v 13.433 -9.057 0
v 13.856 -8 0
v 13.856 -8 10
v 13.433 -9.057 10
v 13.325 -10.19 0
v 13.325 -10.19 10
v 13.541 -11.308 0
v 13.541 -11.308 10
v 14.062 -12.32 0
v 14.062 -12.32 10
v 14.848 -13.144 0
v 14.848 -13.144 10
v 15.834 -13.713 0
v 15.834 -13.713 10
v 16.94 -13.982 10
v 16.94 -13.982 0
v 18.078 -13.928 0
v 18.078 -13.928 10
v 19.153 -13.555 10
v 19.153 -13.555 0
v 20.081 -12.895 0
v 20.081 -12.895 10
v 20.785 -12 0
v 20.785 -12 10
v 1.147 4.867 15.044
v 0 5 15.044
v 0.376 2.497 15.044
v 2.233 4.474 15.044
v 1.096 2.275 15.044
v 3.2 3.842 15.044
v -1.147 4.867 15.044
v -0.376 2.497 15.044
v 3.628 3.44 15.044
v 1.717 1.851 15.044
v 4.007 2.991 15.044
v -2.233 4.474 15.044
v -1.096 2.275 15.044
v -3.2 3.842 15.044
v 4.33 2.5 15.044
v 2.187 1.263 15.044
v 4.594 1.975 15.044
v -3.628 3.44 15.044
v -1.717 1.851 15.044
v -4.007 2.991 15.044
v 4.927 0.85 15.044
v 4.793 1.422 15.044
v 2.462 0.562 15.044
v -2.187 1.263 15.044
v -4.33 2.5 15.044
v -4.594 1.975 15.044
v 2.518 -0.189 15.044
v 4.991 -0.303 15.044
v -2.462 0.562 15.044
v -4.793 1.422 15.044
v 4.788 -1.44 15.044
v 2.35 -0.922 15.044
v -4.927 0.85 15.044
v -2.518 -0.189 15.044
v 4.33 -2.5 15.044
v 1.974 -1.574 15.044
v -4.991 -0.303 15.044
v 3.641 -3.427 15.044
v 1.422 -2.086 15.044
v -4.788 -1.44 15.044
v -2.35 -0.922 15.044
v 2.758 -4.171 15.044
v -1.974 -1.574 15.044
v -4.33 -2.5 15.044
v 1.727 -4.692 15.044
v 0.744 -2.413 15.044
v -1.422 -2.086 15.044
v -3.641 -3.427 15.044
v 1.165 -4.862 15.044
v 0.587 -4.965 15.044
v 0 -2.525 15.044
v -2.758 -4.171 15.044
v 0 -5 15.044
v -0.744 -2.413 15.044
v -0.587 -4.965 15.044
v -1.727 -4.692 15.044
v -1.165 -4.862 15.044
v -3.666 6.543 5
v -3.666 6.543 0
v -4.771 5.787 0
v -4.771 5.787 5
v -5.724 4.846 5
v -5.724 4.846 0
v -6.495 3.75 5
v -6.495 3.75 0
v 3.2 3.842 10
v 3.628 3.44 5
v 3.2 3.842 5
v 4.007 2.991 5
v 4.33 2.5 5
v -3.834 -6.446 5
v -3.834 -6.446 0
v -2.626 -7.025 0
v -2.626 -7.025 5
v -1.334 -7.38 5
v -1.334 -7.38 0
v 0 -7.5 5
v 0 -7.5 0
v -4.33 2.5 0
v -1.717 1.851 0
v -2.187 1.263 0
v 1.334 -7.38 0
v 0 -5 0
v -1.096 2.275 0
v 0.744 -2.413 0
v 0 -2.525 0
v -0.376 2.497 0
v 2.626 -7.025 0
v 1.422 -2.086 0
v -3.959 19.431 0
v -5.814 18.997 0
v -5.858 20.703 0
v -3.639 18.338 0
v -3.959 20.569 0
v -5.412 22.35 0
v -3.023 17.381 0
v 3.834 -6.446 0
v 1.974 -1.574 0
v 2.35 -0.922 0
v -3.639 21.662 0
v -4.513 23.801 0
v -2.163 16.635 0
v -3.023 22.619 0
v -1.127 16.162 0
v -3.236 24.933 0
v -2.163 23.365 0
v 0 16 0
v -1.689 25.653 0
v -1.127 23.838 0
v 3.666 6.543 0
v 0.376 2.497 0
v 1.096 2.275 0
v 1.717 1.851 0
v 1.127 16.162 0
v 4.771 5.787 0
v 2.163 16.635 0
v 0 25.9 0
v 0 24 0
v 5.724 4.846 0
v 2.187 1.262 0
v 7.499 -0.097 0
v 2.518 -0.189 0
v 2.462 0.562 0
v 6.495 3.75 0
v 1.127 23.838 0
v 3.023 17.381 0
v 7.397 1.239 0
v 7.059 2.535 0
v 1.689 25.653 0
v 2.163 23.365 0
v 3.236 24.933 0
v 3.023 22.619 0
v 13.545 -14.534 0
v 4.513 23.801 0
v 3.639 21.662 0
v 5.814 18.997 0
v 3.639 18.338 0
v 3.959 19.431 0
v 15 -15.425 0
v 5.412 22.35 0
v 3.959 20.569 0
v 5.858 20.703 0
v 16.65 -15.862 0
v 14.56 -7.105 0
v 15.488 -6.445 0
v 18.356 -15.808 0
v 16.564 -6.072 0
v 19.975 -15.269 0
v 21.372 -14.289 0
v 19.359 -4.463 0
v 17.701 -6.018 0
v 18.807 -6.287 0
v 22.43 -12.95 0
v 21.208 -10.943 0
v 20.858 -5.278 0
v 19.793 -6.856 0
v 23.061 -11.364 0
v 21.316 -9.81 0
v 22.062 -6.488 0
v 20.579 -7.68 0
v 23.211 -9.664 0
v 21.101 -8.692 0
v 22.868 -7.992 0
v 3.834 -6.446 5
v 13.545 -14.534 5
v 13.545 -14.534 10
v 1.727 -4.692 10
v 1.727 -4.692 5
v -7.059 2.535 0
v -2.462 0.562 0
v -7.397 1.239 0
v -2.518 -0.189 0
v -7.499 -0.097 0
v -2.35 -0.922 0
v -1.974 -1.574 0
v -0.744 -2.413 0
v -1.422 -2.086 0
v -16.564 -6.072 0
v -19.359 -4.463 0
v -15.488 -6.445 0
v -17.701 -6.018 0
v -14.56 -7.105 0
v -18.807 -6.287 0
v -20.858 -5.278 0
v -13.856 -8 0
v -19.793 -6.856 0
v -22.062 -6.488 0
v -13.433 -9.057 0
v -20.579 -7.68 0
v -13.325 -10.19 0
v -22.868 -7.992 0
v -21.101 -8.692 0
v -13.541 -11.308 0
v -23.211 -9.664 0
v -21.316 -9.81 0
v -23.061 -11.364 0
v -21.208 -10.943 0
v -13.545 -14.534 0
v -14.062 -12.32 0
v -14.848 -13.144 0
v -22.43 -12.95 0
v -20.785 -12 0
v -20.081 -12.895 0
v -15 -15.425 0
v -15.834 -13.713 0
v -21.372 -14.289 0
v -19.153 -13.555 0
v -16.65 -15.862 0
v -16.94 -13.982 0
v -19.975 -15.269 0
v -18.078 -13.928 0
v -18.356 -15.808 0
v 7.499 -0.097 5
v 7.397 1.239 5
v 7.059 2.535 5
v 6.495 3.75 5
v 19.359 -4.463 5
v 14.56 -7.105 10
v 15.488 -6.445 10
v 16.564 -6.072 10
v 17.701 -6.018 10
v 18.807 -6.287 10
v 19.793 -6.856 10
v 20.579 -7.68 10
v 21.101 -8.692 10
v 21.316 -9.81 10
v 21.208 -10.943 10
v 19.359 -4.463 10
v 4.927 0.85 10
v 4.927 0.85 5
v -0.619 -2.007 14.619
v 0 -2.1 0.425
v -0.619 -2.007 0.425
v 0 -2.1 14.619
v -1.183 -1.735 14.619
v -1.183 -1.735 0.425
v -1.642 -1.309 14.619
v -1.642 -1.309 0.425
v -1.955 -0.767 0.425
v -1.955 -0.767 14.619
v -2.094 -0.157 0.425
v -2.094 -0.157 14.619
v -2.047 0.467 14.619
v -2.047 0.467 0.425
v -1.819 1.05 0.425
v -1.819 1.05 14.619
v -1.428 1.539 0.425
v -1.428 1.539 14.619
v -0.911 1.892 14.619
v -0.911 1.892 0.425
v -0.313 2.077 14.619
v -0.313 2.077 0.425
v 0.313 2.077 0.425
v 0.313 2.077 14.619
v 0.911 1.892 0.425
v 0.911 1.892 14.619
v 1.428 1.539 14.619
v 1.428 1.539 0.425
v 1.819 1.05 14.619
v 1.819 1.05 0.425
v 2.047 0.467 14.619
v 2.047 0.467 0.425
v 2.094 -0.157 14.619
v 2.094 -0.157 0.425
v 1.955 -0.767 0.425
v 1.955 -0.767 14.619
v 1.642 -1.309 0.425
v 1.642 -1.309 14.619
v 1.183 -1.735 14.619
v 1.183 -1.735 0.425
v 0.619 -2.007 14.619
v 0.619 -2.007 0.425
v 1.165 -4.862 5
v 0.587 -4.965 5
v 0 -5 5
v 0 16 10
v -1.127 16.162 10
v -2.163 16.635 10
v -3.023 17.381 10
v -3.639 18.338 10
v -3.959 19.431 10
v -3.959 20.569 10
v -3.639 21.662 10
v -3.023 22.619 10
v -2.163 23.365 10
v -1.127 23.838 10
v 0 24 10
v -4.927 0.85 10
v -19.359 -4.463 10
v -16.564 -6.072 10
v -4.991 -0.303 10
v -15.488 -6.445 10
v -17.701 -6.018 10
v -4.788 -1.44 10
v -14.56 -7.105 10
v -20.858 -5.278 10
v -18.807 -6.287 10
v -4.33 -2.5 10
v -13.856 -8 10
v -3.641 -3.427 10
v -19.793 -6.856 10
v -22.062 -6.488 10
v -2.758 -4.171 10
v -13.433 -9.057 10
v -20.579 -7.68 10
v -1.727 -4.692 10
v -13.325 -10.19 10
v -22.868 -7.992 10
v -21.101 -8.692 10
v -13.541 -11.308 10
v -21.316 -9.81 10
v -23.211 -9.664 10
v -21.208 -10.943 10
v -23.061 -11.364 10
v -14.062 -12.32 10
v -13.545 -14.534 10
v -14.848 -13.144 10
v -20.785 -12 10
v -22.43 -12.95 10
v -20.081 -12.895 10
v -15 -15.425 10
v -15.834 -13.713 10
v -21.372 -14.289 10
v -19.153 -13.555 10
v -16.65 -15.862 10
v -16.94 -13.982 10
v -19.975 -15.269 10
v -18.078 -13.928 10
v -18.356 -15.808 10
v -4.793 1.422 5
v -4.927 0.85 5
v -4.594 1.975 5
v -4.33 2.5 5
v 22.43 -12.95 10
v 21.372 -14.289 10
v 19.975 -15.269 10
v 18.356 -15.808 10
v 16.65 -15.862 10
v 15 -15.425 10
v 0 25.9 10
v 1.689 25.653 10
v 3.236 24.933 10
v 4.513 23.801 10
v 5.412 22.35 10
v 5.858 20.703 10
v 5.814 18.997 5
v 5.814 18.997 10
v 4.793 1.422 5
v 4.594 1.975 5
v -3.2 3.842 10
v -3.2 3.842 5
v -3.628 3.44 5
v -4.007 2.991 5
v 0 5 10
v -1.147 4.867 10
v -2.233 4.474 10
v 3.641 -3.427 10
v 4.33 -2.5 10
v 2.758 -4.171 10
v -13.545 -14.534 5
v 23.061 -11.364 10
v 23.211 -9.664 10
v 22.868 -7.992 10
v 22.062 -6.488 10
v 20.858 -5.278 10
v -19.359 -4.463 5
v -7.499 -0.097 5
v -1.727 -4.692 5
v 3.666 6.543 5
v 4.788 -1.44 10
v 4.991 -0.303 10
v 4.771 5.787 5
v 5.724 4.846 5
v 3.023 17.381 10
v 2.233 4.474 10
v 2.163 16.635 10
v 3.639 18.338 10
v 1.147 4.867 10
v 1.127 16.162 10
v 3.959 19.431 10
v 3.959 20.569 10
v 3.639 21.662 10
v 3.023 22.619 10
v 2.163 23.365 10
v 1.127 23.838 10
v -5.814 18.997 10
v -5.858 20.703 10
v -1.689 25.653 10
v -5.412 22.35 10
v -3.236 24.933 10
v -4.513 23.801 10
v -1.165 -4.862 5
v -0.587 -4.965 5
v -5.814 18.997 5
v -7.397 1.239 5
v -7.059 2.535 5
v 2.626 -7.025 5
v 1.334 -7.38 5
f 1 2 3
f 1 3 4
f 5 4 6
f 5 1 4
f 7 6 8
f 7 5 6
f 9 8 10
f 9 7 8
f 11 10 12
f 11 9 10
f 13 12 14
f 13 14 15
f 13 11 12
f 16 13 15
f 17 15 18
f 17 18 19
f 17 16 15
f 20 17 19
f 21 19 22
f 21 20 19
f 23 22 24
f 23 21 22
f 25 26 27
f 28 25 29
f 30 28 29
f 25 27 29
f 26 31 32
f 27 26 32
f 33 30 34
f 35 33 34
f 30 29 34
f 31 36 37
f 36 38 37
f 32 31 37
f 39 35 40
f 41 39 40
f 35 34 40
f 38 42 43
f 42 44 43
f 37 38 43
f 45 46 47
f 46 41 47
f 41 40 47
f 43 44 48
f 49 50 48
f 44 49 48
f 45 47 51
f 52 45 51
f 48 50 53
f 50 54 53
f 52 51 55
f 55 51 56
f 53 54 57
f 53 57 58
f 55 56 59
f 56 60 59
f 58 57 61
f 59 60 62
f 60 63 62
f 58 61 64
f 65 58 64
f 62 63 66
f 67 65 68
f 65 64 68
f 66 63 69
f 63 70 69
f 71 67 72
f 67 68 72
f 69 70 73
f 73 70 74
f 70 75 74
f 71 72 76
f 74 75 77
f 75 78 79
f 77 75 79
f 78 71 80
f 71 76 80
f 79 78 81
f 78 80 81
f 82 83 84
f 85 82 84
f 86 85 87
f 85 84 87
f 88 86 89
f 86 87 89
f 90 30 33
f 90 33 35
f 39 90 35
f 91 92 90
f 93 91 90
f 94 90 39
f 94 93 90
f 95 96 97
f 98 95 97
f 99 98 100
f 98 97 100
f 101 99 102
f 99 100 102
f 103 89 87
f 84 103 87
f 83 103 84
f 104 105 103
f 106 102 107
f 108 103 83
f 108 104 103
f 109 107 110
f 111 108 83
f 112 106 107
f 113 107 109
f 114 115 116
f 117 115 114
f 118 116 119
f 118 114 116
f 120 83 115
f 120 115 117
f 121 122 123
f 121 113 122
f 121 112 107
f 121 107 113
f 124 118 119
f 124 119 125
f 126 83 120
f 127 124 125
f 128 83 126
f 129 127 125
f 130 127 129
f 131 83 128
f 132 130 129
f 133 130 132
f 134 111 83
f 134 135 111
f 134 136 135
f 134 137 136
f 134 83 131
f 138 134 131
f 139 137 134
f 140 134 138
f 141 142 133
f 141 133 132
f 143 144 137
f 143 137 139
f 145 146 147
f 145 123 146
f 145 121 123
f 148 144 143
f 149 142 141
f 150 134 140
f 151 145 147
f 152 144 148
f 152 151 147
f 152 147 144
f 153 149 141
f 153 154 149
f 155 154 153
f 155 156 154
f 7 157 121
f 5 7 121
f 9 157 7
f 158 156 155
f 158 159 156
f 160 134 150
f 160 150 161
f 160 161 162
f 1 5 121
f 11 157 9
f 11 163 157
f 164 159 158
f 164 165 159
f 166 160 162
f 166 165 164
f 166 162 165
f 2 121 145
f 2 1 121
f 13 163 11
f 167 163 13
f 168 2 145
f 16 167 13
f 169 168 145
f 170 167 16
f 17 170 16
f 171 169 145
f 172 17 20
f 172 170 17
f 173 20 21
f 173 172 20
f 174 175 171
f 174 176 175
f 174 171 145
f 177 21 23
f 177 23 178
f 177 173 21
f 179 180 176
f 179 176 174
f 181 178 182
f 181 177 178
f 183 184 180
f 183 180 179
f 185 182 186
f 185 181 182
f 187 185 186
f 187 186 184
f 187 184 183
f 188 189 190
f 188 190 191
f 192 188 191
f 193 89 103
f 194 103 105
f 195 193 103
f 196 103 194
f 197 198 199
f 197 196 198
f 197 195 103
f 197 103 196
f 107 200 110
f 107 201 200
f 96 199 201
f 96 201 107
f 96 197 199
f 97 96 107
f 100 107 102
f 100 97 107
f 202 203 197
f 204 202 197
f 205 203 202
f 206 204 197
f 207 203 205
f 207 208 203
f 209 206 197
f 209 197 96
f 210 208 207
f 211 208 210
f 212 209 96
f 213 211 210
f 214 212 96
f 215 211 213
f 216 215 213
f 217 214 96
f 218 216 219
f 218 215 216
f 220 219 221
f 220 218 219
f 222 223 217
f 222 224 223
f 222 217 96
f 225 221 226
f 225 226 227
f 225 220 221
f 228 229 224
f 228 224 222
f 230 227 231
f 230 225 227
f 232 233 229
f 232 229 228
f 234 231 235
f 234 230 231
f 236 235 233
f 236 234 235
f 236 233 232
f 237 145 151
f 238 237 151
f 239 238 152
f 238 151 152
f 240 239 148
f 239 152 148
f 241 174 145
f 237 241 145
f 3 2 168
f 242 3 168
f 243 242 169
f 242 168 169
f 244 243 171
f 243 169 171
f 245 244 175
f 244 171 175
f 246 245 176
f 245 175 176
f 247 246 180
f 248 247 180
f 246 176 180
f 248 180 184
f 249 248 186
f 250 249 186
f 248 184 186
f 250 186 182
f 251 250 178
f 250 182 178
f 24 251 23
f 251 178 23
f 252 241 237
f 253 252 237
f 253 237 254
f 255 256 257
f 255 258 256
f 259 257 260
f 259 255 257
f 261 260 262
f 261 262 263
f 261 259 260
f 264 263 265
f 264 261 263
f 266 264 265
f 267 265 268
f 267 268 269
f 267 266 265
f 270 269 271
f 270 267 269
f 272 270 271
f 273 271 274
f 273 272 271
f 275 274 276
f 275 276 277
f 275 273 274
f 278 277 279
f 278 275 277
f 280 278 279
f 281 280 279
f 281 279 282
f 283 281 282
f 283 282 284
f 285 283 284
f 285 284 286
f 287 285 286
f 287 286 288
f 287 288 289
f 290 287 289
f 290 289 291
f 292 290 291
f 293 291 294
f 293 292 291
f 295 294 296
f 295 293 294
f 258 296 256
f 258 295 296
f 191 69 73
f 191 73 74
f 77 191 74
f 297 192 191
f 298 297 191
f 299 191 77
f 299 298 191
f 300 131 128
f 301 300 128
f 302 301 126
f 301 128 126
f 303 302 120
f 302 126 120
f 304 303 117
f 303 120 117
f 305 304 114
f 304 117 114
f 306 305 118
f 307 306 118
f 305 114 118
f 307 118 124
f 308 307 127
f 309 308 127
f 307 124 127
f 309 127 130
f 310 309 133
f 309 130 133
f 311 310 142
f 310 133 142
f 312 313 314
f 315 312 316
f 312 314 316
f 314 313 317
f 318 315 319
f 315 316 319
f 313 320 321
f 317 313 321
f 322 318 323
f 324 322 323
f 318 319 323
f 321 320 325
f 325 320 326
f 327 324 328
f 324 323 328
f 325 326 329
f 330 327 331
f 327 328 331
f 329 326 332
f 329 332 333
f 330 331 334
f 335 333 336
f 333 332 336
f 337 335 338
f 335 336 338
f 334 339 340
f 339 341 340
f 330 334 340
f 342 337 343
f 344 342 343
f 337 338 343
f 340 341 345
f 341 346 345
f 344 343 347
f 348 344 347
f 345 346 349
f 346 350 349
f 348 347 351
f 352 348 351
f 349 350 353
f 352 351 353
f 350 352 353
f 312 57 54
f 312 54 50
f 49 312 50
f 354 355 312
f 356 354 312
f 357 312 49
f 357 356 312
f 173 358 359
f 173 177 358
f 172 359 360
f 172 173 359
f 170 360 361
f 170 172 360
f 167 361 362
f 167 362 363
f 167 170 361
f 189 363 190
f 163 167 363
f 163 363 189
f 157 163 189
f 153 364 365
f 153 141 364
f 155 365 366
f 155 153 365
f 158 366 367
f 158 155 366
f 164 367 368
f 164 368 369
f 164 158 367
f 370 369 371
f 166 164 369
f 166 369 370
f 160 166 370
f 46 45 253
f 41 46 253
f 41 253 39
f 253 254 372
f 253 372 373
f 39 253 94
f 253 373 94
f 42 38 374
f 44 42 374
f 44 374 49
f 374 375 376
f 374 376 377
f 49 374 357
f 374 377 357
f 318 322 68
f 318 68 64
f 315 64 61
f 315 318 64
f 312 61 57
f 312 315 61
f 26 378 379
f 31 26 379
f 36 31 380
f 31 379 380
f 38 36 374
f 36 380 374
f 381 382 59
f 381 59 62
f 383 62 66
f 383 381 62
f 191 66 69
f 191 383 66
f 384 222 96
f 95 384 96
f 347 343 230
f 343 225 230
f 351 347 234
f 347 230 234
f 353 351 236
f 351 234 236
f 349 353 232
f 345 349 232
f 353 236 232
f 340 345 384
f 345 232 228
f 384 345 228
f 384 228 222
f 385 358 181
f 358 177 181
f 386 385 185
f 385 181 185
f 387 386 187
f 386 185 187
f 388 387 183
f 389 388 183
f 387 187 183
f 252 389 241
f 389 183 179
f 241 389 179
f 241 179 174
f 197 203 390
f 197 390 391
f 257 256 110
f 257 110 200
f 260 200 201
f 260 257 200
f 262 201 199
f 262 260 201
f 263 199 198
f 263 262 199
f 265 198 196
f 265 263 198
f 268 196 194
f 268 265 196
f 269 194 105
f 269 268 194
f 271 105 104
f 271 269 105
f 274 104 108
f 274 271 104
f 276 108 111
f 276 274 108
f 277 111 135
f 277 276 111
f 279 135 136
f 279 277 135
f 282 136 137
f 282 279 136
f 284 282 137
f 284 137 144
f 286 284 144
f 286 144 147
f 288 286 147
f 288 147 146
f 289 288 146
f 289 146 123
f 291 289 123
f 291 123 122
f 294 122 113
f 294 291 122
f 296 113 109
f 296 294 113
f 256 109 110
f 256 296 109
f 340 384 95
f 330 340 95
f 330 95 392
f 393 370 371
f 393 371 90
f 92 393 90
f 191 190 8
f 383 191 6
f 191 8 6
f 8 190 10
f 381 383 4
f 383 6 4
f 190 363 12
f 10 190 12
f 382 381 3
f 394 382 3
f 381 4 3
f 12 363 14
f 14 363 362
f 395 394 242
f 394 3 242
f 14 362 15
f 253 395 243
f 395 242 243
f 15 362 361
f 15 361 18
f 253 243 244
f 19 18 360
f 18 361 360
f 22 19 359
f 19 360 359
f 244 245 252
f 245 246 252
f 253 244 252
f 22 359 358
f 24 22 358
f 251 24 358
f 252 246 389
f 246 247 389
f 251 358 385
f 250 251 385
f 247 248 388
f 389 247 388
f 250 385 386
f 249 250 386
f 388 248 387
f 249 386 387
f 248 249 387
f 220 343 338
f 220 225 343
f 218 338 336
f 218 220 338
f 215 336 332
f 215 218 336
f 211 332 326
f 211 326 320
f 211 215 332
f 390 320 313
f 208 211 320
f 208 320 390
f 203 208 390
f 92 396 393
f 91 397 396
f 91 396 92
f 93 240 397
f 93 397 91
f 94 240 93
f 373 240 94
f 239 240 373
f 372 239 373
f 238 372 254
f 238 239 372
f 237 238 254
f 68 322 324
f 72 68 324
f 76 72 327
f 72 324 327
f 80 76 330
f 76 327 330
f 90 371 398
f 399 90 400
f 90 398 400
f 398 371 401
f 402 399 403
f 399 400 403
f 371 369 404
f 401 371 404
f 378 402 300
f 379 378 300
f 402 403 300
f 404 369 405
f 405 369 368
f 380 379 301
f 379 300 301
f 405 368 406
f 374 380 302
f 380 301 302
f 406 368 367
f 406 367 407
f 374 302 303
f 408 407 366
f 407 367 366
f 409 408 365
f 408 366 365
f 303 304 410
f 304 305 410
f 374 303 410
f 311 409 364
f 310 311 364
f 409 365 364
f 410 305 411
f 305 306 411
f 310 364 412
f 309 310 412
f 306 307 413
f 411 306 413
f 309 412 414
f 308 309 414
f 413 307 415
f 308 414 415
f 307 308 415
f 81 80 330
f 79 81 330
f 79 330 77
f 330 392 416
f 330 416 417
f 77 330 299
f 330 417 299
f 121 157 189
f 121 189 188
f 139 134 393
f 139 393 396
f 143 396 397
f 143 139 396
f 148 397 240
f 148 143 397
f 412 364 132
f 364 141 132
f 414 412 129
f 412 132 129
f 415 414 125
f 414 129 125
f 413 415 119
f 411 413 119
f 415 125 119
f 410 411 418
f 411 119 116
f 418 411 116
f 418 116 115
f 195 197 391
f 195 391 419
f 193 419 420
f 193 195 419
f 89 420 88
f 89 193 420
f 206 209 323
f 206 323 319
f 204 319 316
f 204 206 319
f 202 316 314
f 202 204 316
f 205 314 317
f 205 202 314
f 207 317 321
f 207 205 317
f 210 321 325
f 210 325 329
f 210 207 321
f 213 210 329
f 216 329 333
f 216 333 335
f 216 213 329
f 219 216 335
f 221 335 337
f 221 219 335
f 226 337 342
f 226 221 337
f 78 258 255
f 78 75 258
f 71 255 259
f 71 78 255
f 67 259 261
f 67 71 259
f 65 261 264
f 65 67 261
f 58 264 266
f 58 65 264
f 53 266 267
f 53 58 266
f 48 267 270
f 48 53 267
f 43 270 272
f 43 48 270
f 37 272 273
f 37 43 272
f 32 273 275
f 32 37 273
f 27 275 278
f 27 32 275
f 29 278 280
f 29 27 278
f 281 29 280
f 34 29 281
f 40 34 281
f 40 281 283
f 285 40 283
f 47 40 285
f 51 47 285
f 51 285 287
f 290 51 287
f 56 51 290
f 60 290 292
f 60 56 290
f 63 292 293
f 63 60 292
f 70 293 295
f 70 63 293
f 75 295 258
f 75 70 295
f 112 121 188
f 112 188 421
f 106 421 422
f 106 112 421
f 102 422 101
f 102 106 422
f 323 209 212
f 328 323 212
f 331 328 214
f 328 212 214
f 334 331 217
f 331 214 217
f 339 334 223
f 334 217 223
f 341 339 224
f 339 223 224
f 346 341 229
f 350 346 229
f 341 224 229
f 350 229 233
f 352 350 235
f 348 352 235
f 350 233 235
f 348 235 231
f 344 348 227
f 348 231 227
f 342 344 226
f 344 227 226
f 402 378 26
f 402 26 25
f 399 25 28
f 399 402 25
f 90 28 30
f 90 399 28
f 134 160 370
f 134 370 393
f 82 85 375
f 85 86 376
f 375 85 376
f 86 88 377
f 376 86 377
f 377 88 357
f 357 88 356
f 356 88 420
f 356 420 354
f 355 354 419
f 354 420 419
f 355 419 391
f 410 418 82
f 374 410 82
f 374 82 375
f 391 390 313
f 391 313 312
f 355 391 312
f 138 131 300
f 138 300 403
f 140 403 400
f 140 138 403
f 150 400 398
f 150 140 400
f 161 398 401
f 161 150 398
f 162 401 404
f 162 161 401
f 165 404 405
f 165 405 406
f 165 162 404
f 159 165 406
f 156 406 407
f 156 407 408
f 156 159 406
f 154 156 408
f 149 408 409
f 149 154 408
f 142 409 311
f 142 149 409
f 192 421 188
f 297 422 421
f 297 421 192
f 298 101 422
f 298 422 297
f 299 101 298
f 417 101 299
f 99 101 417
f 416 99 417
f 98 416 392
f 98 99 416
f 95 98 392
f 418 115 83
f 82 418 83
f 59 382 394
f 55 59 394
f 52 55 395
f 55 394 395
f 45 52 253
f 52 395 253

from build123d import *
from build123d.topology import SkipClean

# Parameters (mm, degrees)
BOSS_EXTRUDE1_DEPTH = 5
BOSS_EXTRUDE3_DEPTH = 5
BOSS_EXTRUDE4_DEPTH = 5.043608808
CIRPATTERN1_COUNT   = 3


with BuildPart() as part:
    # Sketch1 → Boss-Extrude1 (new body)
    with BuildSketch(Plane.XY):
        with BuildLine():
            ThreePointArc((0, 16), (-4, 20), (0, 24))
            Line((0, 24), (0, 25.9))
            ThreePointArc((0, 25.9), (-4.51263227, 23.800809124), (-5.814119968, 18.997))
            Line((-5.814119968, 18.997), (-3.665691684, 6.54314179))
            ThreePointArc((-3.665691684, 6.54314179), (-5.268898566, 5.337481419), (-6.495190528, 3.75))
            Line((-6.495190528, 3.75), (0, 0))
            Line((0, 0), (0, 16))
        make_face()
    extrude(amount=BOSS_EXTRUDE1_DEPTH)

    # Sketch2 → Boss-Extrude3 (add)
    with BuildSketch(Plane.XY.offset(5)):
        with BuildLine():
            ThreePointArc((0, 16), (-4, 20), (0, 24))
            Line((0, 24), (0, 25.9))
            ThreePointArc((0, 25.9), (-4.51263227, 23.800809124), (-5.814119968, 18.997))
            Line((-5.814119968, 18.997), (-3.199731749, 3.84209796))
            ThreePointArc((-3.199731749, 3.84209796), (-3.824264635, 3.221024682), (-4.330127019, 2.5))
            Line((-4.330127019, 2.5), (0, 0))
            Line((0, 0), (0, 16))
        make_face()
    extrude(amount=BOSS_EXTRUDE3_DEPTH)

    # Sketch4 → Boss-Extrude4 (add)
    with BuildSketch(Plane.XY.offset(10)):
        with BuildLine():
            Line((0, 0), (0, 5))
            ThreePointArc((0, 5), (-2.5, 4.330127019), (-4.330127019, 2.5))
            Line((-4.330127019, 2.5), (0, 0))
        make_face()
    extrude(amount=BOSS_EXTRUDE4_DEPTH)

    # Mirror1: part across plane


with BuildPart() as part_1:
    with SkipClean():  # the faces are left unmerged after this step: merging them gives an invalid solid
        add(part.part)
        add(part.part.mirror(Plane(origin=(0, 0, 0), x_dir=(0, 0, 1), z_dir=(1, 0, 0))))


with BuildPart() as cirpattern1_1:
    # CirPattern1: pattern copy
    add(part_1.part.rotate(Axis((0, 0, 20.990521912), (0, 0, -1)), 1 * 360 / CIRPATTERN1_COUNT))


with BuildPart() as cirpattern1_2:
    # CirPattern1: pattern copy
    add(part_1.part.rotate(Axis((0, 0, 20.990521912), (0, 0, -1)), 2 * 360 / CIRPATTERN1_COUNT))


with BuildPart() as part_2:
    add(part_1.part)

    # Combine1: union CirPattern1_1, CirPattern1_2
    add(cirpattern1_1.part)
    add(cirpattern1_2.part)

    # Sketch8 → M5 Tapped Hole1 (revolve, cut)
    with SkipClean():  # the faces are left unmerged after this step: merging them gives an invalid solid
        with BuildSketch(Plane(origin=(0, 0, 15.043608808), x_dir=(0, -1, 0), z_dir=(1, 0, 0))):
            Polygon((0, 0), (0, 15.043608808), (2.525, 15.043608808), (2.1, 14.618608808), (2.1, 0.425), (2.525, 0), align=None)
        revolve(axis=Axis((0, 0, 21.393608808), (0, 0, -1)), mode=Mode.SUBTRACT)


solid = part_2.part
